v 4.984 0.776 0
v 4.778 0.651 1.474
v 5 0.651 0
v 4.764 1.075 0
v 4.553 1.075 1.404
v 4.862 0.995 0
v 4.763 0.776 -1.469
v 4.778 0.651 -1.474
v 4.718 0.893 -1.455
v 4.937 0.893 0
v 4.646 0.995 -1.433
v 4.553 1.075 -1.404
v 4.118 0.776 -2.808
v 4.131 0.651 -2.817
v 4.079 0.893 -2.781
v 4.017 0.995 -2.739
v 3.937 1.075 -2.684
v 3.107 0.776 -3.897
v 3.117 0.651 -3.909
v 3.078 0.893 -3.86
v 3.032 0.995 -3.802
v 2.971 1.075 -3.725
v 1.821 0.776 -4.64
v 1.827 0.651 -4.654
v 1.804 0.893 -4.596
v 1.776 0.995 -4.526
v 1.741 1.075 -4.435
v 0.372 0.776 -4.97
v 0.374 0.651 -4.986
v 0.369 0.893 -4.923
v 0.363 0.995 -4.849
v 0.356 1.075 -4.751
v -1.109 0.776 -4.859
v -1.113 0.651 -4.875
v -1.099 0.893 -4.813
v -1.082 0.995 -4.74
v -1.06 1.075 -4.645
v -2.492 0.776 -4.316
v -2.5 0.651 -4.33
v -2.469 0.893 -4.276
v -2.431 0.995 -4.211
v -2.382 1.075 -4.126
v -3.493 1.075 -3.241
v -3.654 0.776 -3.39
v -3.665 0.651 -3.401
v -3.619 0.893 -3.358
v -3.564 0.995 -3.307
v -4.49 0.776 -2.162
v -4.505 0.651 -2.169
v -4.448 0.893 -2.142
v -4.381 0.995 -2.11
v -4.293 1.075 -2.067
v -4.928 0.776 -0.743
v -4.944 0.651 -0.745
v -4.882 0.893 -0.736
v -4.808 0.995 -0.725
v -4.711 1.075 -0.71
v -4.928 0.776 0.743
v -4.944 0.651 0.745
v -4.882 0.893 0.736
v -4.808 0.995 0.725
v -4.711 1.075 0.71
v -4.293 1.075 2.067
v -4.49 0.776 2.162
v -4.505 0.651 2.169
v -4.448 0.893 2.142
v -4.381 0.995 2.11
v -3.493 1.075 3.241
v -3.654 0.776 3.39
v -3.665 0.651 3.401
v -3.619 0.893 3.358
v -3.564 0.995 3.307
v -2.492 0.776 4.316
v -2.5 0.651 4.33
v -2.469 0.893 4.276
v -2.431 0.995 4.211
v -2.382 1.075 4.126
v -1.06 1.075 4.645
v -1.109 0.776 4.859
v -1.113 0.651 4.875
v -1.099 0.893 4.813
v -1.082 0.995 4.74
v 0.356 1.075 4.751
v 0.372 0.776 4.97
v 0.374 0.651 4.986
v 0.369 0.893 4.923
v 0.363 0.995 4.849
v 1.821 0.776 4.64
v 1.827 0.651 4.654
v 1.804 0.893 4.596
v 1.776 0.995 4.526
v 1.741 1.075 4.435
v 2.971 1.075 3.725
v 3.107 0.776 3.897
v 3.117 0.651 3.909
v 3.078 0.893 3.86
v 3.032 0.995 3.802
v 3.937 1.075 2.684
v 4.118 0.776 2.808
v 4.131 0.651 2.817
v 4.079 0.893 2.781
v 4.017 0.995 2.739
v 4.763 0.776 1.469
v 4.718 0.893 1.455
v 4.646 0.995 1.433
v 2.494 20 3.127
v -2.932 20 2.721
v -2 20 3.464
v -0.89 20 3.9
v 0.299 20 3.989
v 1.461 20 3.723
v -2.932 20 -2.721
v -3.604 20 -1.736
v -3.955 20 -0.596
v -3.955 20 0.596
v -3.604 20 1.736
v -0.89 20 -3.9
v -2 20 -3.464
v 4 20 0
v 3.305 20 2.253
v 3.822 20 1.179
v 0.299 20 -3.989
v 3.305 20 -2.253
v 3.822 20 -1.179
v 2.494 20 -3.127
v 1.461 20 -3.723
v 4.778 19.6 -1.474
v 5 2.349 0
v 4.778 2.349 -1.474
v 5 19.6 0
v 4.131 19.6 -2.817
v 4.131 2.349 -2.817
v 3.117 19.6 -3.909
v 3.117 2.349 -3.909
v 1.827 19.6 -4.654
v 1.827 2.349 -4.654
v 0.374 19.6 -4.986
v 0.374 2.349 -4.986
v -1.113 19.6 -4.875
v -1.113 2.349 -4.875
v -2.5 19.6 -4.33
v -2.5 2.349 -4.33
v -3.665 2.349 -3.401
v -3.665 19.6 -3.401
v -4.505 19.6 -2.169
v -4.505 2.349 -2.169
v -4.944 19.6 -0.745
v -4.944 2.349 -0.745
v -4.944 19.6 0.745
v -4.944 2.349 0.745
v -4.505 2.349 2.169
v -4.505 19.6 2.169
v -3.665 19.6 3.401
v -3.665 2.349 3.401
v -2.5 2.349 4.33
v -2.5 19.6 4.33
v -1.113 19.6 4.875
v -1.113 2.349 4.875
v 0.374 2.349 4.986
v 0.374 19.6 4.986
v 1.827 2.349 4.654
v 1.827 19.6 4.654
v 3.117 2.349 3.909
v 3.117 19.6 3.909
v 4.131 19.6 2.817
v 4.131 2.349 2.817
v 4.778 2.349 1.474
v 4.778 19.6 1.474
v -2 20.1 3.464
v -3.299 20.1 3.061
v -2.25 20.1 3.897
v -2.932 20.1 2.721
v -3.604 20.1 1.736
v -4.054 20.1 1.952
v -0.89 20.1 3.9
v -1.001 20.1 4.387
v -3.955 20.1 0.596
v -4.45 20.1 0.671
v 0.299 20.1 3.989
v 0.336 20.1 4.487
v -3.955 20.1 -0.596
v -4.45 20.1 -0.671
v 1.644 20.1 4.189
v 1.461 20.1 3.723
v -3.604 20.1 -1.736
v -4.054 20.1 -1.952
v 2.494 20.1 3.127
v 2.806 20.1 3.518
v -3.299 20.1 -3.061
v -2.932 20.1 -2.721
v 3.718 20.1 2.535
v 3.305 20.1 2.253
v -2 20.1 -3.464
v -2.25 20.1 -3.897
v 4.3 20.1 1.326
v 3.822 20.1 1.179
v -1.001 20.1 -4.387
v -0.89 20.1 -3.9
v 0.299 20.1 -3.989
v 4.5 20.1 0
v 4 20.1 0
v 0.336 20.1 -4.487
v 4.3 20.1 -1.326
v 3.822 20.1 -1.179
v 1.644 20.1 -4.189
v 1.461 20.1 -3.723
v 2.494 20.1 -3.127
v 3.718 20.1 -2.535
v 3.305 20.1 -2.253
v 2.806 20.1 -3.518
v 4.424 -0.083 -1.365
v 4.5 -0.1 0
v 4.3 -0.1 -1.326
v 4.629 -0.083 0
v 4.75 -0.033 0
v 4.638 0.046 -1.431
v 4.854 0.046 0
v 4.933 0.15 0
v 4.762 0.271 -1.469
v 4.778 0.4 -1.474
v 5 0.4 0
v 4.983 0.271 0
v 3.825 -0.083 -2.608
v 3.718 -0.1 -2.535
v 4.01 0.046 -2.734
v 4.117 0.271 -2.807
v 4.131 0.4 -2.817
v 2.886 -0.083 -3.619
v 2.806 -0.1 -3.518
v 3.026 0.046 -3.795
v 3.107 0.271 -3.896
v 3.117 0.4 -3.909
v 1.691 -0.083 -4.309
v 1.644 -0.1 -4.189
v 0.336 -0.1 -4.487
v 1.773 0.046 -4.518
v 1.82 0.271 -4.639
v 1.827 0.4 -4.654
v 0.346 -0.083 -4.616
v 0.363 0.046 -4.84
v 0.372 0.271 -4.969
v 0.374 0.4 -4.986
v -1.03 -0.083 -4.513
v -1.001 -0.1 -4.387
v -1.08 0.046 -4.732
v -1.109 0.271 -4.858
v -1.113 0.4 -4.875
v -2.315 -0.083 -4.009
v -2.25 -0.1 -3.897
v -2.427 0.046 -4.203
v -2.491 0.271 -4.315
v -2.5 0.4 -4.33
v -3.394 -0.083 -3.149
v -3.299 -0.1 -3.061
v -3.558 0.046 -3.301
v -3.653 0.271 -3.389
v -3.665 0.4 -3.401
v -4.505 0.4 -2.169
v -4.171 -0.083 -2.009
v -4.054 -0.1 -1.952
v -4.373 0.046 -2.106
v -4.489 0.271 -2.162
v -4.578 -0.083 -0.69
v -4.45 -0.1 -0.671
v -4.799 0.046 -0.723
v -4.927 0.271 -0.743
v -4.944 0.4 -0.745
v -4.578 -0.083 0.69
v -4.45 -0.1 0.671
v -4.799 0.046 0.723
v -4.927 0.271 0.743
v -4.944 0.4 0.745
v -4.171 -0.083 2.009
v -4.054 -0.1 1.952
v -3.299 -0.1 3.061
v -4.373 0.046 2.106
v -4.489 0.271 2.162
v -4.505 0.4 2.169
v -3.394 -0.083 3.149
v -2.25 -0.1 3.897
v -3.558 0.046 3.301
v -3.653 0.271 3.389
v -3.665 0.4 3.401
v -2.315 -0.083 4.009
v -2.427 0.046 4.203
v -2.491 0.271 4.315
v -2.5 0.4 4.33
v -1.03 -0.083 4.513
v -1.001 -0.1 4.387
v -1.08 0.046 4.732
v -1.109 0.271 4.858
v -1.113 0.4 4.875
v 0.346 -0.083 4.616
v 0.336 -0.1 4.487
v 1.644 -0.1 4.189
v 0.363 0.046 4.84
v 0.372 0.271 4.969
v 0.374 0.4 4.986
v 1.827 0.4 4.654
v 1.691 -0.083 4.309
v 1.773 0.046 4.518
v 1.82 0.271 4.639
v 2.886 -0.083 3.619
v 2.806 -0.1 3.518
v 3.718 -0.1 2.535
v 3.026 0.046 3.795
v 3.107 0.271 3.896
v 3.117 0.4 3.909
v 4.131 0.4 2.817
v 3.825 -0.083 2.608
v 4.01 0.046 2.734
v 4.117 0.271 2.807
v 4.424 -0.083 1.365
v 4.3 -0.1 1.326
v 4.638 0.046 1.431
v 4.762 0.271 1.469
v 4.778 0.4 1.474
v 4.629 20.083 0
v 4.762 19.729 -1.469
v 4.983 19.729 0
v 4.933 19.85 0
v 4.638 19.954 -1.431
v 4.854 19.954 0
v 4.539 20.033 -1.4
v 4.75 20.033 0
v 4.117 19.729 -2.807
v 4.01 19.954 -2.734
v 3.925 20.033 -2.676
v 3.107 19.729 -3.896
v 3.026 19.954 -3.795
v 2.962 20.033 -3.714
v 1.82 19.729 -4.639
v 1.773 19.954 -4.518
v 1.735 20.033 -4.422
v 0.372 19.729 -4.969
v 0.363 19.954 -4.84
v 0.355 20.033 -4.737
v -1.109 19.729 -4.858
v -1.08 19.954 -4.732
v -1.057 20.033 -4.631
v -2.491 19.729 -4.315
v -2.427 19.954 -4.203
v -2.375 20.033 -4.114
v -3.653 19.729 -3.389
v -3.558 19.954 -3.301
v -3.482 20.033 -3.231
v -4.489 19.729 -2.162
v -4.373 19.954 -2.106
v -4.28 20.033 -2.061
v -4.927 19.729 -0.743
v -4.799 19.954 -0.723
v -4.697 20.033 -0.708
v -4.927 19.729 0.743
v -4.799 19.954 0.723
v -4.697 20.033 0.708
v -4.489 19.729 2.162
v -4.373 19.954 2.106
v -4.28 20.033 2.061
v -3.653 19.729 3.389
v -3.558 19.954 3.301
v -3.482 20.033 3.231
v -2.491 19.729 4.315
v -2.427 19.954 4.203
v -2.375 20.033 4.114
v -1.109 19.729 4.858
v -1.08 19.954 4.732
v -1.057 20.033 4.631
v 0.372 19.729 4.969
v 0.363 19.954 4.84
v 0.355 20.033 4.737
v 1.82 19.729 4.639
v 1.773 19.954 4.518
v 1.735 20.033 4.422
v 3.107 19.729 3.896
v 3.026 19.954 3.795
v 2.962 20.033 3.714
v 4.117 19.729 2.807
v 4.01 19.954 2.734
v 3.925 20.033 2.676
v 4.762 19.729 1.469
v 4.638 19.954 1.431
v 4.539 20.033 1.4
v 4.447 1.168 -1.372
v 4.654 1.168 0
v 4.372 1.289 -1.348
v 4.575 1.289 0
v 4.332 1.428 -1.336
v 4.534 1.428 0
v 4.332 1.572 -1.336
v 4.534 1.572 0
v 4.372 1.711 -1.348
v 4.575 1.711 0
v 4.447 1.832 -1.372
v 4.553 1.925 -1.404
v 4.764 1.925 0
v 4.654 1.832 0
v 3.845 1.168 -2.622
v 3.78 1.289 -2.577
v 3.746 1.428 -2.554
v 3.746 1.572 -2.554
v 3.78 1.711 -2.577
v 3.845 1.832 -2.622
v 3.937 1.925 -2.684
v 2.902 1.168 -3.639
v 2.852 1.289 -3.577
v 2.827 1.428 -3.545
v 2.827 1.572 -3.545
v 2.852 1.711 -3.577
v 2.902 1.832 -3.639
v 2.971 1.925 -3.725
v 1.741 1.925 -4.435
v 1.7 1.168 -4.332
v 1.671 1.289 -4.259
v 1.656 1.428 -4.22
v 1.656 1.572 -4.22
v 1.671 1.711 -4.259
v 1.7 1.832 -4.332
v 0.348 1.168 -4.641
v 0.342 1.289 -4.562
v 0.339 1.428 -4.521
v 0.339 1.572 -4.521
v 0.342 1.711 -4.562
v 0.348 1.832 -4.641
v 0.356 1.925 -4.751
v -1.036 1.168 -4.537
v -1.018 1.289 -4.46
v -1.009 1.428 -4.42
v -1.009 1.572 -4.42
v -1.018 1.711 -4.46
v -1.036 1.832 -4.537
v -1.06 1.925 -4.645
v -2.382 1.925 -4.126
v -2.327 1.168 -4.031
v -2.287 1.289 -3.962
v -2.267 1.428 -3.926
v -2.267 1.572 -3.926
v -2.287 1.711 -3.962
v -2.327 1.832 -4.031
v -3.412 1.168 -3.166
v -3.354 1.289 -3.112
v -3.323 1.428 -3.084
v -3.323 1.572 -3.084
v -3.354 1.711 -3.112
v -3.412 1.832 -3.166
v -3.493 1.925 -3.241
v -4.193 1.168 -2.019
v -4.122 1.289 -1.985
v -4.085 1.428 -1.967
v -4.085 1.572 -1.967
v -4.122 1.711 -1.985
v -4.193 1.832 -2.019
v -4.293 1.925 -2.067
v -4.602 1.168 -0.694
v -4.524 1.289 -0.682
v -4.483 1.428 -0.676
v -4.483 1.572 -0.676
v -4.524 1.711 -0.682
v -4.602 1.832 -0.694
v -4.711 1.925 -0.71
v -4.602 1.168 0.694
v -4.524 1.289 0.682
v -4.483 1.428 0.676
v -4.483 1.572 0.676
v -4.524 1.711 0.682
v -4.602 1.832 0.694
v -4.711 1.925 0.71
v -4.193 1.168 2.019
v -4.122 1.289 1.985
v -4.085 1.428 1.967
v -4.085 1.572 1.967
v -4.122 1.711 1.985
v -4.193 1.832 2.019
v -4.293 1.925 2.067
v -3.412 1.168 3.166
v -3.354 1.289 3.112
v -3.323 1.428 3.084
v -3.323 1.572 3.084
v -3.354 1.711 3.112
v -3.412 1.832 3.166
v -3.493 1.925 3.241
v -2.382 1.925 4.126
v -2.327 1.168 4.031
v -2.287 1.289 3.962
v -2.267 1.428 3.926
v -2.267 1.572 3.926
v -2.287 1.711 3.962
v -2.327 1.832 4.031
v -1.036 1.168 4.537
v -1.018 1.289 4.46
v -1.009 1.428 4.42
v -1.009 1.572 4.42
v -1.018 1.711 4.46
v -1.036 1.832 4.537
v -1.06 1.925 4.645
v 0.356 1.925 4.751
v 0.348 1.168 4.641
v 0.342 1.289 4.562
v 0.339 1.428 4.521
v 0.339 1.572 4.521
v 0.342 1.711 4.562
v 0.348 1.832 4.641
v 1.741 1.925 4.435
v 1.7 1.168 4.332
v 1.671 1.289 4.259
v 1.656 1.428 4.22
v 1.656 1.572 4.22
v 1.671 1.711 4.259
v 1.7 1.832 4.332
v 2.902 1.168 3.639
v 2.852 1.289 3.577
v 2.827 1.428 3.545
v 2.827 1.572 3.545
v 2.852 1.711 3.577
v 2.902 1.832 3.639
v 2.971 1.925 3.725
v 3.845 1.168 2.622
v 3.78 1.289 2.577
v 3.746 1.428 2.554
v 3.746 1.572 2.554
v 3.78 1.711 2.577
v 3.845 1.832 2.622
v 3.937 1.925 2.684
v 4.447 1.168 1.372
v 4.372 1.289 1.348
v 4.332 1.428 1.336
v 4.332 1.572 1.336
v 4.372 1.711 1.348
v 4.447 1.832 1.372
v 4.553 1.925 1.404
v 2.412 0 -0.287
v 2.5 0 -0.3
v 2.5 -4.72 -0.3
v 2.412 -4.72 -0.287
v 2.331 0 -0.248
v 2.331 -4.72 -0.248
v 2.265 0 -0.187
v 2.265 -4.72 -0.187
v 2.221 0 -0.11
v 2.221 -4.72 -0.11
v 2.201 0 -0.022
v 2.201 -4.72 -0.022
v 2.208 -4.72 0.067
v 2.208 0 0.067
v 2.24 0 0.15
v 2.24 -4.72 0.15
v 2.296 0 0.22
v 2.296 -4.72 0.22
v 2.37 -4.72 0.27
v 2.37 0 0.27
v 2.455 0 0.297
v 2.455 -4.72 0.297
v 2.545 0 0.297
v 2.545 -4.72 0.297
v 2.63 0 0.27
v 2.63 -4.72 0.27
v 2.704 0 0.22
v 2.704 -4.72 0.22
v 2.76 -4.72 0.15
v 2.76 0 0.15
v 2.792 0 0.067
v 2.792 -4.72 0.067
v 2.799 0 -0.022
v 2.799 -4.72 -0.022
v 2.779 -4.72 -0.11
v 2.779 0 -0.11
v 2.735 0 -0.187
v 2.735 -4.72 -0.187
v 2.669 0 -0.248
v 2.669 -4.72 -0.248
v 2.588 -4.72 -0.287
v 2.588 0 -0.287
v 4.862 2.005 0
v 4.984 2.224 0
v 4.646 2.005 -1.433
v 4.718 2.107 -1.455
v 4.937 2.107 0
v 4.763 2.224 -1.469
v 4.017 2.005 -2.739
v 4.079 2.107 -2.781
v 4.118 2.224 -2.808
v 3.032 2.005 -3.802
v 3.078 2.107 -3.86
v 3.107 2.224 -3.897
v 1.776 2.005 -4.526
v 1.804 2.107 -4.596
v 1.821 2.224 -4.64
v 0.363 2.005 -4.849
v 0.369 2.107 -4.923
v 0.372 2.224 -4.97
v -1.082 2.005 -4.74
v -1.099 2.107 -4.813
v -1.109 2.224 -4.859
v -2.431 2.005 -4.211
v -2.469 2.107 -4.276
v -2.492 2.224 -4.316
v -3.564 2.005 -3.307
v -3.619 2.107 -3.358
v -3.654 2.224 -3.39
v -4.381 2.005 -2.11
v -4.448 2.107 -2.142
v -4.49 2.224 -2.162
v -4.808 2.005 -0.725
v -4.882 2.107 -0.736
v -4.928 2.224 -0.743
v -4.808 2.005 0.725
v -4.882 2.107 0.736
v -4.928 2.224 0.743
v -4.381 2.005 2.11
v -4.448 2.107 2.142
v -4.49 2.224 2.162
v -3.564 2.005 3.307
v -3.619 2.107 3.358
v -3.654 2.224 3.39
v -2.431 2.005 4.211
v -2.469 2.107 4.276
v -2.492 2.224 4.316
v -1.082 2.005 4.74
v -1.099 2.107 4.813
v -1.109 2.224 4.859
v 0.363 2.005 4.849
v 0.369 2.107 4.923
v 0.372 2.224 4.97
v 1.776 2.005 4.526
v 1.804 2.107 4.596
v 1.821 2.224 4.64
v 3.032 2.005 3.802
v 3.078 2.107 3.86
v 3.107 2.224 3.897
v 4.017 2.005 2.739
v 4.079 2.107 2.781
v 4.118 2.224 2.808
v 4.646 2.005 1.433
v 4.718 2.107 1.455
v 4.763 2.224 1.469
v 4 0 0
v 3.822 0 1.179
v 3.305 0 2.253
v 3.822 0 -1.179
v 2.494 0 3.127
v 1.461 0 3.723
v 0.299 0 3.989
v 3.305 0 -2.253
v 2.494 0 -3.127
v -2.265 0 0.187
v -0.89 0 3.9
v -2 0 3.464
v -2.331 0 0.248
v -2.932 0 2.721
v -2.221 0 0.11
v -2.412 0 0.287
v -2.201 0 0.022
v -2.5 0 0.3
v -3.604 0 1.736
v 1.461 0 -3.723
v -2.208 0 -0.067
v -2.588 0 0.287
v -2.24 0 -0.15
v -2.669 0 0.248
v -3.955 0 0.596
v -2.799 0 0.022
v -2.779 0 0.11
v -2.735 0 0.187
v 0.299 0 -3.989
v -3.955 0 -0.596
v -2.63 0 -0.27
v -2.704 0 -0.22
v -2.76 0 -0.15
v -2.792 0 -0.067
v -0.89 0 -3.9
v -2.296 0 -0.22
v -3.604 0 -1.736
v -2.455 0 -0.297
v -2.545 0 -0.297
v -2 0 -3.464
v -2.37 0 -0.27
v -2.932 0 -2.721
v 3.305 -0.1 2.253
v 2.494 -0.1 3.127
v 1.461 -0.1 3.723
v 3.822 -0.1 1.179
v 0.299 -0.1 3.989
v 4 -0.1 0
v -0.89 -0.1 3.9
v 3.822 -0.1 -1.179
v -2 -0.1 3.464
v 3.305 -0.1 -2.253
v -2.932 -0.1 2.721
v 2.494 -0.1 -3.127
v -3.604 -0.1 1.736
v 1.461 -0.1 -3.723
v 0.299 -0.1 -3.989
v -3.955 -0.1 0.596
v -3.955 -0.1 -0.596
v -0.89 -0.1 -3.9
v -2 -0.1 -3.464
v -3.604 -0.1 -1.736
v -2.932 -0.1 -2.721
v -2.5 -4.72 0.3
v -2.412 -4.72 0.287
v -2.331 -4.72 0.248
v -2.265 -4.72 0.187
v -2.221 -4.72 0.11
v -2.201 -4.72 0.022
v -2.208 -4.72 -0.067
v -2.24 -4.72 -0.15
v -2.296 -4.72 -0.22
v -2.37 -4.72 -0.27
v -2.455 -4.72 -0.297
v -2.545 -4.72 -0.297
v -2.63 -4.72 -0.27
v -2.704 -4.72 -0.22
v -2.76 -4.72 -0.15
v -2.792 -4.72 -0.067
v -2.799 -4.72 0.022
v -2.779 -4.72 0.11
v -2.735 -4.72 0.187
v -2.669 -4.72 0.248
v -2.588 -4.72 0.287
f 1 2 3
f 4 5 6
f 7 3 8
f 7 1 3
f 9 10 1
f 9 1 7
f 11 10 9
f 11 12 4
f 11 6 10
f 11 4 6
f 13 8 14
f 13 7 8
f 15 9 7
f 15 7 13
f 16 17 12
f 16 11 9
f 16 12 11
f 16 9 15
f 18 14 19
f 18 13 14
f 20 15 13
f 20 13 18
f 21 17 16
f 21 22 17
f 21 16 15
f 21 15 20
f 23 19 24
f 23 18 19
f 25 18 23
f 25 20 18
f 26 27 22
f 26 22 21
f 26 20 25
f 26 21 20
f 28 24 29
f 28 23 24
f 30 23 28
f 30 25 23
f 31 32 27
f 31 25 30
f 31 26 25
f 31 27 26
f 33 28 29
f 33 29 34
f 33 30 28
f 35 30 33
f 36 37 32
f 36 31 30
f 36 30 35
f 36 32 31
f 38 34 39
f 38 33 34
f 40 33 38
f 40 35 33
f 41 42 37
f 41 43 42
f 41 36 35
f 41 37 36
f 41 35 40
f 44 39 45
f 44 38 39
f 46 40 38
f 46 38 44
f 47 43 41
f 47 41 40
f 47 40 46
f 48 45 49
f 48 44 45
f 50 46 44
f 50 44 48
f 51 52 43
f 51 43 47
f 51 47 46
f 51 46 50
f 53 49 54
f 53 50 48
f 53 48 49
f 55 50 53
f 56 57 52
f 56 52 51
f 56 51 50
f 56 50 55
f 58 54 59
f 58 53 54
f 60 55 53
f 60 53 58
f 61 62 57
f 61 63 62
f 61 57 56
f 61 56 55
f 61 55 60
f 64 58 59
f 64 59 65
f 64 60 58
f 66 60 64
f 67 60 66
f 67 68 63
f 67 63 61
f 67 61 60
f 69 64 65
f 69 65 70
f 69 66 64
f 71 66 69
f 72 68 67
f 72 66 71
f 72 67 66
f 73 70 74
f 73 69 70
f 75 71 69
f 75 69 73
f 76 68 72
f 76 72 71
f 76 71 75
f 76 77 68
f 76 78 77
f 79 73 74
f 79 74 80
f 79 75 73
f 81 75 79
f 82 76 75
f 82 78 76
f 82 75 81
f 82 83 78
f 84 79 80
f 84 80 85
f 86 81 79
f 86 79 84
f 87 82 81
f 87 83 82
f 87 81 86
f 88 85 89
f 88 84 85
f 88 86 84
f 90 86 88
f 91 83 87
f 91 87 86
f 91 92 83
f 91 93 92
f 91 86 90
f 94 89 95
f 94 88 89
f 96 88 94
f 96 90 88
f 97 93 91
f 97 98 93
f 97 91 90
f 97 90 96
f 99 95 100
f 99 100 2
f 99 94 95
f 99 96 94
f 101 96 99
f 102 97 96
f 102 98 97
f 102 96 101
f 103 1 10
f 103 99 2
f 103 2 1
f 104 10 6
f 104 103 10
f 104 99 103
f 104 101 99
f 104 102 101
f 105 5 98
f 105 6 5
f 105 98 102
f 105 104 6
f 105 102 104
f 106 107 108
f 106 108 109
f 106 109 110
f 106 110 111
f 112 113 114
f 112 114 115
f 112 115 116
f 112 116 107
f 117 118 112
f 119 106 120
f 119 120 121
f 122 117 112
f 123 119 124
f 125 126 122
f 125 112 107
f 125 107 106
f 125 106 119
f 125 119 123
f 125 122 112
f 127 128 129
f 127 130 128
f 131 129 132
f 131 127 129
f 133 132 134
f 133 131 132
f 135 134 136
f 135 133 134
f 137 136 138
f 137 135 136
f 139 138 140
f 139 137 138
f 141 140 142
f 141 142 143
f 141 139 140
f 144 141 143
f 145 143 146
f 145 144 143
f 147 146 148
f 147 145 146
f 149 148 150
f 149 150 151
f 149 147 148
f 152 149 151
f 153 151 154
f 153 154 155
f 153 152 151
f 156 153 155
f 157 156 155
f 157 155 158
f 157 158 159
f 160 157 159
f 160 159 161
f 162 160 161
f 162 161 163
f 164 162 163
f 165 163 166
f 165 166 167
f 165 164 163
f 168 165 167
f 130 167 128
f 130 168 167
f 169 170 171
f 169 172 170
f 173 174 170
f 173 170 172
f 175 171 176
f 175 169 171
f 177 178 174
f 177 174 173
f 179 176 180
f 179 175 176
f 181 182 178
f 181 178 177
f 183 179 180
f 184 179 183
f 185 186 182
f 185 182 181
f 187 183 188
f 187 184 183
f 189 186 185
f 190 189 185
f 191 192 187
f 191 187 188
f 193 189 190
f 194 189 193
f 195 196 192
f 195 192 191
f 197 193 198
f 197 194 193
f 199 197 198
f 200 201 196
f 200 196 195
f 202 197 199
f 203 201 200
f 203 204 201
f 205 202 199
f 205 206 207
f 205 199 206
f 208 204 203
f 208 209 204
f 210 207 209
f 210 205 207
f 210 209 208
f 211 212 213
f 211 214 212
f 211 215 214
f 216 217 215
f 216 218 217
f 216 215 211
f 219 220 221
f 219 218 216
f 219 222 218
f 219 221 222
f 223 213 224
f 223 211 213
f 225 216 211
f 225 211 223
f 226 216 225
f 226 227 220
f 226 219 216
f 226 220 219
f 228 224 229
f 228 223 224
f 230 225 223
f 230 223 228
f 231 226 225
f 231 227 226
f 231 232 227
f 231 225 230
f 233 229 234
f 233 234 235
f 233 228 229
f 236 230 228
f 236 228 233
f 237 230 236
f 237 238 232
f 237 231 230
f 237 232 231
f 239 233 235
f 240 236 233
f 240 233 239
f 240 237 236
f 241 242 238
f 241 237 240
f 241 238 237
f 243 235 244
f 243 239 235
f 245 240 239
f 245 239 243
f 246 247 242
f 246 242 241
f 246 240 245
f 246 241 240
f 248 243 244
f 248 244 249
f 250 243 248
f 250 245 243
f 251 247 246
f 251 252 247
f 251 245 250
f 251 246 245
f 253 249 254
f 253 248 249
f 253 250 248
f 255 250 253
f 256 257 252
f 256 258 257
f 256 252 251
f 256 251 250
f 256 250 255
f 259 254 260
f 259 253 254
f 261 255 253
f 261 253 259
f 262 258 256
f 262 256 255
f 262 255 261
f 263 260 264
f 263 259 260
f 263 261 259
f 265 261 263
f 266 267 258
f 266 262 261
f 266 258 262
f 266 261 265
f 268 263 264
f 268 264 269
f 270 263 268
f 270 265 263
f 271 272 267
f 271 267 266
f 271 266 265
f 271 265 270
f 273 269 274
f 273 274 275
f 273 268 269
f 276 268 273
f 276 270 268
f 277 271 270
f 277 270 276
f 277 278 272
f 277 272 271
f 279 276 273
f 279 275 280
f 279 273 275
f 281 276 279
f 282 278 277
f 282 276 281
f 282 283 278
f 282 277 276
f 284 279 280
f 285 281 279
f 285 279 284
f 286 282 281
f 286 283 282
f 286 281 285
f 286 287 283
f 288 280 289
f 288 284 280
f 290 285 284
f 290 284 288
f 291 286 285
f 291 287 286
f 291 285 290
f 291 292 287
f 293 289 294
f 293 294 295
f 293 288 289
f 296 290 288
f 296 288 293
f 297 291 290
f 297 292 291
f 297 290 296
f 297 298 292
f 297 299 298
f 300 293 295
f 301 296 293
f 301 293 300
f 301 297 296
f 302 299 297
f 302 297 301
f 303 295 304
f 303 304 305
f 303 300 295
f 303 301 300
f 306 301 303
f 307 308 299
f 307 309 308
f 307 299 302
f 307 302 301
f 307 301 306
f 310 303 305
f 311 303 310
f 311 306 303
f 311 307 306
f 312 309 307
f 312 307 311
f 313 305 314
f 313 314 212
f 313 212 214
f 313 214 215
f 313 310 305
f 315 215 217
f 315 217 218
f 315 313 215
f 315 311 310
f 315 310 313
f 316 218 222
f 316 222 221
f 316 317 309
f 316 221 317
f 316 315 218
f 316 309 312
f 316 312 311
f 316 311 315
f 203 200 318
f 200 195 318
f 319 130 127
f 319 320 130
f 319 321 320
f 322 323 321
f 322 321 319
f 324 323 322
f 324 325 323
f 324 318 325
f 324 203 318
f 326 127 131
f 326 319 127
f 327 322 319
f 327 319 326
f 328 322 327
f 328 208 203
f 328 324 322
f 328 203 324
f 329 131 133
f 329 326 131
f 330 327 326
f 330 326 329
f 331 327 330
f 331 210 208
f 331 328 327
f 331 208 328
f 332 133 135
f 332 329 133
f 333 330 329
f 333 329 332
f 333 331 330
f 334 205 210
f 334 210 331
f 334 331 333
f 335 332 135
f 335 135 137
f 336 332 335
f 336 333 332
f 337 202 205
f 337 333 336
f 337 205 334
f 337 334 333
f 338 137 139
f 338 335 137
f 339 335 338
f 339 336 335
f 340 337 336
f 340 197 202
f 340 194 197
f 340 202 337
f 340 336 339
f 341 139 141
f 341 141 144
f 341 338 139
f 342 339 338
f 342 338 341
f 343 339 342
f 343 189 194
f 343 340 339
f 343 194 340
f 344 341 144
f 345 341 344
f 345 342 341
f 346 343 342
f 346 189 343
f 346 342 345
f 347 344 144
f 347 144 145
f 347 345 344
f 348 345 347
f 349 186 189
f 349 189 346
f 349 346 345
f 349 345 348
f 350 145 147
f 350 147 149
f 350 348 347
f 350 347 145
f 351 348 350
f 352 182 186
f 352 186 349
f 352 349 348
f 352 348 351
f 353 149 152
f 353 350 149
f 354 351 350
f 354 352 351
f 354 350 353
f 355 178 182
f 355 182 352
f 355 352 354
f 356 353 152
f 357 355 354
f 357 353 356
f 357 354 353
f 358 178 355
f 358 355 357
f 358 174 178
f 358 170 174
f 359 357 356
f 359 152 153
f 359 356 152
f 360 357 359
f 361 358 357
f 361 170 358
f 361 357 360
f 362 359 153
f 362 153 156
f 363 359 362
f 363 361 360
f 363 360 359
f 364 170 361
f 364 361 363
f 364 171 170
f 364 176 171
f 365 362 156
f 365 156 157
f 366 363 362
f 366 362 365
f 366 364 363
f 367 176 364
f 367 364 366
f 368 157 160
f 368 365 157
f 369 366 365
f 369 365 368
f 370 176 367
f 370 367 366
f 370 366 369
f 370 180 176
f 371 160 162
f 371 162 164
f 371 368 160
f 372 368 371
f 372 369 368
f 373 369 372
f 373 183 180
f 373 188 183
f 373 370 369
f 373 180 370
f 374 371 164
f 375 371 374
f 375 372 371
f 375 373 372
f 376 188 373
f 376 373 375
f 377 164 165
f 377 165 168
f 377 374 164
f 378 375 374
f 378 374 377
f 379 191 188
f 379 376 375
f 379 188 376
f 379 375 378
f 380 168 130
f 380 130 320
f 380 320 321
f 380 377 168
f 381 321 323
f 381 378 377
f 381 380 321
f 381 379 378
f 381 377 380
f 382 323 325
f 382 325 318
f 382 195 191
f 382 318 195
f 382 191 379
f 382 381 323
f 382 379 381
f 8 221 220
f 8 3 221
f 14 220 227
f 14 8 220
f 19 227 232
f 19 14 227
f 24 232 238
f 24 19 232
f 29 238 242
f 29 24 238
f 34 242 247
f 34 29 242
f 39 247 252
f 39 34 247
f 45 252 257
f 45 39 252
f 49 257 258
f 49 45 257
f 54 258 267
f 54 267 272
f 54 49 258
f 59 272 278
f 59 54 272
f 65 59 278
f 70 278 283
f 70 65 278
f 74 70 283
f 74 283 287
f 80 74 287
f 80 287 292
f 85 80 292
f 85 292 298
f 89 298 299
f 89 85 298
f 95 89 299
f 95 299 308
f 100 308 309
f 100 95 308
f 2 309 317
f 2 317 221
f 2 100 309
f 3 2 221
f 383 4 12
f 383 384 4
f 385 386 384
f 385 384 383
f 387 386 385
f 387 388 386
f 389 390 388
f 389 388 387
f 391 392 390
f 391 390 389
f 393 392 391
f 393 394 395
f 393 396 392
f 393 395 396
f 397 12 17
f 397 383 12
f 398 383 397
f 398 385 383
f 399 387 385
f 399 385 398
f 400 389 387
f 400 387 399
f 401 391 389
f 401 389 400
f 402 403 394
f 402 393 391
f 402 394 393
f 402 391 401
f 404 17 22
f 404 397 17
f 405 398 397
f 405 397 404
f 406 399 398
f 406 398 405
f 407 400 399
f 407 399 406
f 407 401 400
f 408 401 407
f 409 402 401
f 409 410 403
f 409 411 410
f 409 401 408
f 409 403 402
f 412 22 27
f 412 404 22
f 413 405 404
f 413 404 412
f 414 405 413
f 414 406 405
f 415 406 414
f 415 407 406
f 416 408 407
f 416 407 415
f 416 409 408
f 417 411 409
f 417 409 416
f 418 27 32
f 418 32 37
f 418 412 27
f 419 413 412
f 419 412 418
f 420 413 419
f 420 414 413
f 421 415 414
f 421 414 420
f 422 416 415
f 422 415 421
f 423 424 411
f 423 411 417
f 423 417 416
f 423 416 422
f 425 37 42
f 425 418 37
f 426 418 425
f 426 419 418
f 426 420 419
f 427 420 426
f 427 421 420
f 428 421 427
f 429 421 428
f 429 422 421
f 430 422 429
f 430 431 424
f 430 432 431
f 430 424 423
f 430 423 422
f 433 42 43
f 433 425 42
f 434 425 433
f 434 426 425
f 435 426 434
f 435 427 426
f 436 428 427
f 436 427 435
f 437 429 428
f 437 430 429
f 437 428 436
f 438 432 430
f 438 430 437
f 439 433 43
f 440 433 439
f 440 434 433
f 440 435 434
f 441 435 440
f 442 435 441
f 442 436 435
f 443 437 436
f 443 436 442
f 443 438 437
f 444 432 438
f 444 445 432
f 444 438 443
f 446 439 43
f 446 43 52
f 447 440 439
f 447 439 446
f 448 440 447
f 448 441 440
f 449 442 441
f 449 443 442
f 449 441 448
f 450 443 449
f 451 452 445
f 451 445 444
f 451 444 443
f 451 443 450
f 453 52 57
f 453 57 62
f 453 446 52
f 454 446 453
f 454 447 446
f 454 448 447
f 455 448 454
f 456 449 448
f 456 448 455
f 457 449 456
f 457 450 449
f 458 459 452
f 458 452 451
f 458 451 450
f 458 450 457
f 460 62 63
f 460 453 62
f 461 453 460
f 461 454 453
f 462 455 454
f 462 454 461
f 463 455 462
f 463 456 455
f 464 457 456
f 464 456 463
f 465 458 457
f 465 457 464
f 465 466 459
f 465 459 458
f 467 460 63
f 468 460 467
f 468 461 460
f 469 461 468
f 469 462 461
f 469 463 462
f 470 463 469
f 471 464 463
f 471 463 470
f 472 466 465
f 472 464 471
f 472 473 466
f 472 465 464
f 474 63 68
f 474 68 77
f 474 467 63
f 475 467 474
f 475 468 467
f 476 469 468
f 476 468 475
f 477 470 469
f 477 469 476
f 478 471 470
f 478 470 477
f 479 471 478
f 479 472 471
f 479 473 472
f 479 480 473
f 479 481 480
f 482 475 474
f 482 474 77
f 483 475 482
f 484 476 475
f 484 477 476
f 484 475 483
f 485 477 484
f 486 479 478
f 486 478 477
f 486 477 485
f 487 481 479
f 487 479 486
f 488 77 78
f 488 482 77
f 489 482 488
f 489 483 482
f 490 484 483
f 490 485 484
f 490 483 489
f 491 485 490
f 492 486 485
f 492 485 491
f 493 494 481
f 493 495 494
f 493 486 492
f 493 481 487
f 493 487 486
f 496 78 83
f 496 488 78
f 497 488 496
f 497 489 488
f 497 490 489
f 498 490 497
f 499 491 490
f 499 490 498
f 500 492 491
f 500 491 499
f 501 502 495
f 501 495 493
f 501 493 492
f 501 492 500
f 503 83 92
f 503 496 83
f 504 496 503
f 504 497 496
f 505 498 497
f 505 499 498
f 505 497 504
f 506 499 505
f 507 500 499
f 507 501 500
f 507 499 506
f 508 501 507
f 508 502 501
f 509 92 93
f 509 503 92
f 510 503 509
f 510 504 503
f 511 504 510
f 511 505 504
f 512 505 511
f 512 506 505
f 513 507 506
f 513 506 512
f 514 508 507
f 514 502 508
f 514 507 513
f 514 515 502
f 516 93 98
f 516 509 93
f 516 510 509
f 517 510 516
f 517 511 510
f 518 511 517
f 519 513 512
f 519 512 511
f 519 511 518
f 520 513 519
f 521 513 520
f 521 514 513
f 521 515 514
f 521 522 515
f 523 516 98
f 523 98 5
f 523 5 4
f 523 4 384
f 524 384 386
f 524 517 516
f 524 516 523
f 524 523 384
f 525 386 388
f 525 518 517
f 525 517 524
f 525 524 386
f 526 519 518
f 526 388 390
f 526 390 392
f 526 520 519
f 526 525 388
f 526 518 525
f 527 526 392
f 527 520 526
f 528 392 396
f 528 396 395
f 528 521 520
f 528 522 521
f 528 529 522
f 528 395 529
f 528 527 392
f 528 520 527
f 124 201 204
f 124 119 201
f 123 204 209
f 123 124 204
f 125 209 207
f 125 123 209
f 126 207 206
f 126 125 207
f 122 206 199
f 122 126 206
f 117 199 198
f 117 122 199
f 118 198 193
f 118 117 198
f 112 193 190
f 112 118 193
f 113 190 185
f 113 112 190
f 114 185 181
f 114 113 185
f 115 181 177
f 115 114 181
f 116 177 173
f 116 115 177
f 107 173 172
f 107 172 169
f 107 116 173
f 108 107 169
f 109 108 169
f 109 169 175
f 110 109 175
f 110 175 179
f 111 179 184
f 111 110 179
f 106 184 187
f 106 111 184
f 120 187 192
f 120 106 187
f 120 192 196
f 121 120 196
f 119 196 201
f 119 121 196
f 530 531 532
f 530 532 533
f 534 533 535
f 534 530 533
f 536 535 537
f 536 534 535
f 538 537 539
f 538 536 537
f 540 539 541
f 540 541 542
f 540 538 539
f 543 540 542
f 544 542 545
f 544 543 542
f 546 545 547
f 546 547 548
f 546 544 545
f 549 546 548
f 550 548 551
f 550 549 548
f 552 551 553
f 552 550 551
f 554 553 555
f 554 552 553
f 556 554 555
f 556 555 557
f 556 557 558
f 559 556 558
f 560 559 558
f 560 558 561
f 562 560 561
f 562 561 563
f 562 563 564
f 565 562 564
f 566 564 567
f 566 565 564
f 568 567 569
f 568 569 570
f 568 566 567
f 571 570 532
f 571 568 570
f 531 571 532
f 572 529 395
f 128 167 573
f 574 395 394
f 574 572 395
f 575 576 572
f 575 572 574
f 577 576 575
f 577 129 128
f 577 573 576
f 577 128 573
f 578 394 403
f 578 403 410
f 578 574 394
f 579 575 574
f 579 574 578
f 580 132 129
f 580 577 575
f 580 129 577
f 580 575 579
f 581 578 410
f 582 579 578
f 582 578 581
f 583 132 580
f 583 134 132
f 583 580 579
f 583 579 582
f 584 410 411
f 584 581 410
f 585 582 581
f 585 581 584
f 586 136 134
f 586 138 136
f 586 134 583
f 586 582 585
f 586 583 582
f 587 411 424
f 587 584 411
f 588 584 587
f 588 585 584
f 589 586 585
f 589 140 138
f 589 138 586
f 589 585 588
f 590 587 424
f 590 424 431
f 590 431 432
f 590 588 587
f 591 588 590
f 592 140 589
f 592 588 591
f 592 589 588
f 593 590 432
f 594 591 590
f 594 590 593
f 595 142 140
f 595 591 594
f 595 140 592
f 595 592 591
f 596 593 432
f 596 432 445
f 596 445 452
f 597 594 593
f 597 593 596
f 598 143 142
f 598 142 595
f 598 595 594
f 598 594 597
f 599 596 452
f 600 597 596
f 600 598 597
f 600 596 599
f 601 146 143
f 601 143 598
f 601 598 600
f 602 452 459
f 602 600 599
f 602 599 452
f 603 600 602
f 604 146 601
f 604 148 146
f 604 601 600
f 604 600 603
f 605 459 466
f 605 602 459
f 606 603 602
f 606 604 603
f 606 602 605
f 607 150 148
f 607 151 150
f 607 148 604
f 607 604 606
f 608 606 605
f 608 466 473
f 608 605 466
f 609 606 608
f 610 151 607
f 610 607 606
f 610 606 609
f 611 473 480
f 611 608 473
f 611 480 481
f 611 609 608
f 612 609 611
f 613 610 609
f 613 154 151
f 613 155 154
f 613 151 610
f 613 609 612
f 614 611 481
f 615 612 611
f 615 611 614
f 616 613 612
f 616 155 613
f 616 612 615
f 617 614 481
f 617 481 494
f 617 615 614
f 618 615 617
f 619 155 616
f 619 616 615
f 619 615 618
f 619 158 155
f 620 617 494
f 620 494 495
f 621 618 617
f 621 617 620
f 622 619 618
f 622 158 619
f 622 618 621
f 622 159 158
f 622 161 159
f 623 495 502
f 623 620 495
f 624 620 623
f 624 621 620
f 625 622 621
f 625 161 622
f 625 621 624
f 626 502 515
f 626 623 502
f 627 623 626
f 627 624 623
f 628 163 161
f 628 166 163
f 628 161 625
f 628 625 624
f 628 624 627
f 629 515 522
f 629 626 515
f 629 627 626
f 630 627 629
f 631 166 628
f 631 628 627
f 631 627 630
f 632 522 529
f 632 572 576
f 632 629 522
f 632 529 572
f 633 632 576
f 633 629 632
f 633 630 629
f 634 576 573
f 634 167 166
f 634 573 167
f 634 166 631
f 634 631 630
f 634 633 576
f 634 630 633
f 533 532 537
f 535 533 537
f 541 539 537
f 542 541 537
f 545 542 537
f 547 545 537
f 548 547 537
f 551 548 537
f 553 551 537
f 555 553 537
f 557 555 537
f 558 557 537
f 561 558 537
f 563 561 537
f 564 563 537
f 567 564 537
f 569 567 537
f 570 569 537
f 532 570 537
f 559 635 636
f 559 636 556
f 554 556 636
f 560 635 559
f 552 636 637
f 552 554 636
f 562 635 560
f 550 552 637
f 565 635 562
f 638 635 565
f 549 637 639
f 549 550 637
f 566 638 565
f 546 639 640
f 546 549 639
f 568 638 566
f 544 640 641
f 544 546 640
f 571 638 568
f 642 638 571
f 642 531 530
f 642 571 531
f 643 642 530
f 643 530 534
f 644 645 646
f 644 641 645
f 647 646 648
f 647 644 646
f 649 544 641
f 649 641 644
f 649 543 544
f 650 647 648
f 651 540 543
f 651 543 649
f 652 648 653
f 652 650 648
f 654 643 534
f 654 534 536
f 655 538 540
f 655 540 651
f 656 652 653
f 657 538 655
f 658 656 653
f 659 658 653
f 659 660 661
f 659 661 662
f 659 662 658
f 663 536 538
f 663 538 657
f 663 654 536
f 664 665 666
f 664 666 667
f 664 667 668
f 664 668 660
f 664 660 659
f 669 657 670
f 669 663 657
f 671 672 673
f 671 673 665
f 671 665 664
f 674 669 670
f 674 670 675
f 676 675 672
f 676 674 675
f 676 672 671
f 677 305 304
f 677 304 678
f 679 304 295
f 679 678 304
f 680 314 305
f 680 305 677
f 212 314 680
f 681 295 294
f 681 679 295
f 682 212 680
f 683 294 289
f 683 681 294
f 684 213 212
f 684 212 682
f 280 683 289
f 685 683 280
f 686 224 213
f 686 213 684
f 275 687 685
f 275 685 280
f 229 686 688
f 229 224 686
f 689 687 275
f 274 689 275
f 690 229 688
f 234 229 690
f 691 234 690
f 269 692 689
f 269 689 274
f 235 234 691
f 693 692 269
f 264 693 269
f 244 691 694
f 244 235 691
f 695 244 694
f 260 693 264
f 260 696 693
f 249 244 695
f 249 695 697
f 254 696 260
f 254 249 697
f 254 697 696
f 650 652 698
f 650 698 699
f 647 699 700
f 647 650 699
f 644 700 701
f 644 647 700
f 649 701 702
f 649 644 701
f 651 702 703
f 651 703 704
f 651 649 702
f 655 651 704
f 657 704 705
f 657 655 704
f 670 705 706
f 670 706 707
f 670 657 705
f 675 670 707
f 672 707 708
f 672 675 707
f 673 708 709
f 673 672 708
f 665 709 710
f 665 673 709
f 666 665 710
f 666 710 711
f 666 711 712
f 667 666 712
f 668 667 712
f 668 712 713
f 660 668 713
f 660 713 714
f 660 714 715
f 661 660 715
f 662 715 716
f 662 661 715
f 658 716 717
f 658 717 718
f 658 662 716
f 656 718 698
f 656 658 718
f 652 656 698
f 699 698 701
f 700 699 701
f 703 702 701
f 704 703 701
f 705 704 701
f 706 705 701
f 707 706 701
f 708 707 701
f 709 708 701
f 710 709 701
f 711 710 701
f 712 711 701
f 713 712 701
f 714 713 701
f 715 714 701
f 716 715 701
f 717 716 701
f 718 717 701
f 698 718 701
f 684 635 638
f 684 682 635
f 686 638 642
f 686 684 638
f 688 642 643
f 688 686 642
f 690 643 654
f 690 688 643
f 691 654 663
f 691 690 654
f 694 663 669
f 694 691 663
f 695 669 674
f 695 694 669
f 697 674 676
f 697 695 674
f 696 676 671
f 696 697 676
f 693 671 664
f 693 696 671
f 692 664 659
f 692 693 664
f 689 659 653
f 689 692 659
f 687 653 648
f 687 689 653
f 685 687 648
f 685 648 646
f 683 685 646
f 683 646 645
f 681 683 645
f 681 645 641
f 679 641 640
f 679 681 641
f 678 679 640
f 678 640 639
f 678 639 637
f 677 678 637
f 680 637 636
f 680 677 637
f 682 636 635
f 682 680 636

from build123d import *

# Parameters (mm, degrees)
SKETCH1_R             = 0.3
BOSS_EXTRUDE1_DEPTH   = 4.72
BOSS_EXTRUDE1_2_DEPTH = 4.72


with BuildPart() as part:
    # Sketch1 → Boss-Extrude1 (new body)
    with BuildSketch(Plane(origin=(0, 0, 0), x_dir=(1, 0, 0), z_dir=(0, 1, 0))):
        with Locations(Location((-2.5, 0, 0), (0, 0, 270))):
            Circle(SKETCH1_R)
    extrude(amount=-BOSS_EXTRUDE1_DEPTH)



with BuildPart() as body_2:
    # Sketch1 → Boss-Extrude1 2 (new body)
    with BuildSketch(Plane(origin=(0, 0, 0), x_dir=(1, 0, 0), z_dir=(0, 1, 0))):
        with Locations(Location((2.5, 0, 0), (0, 0, 90))):
            Circle(SKETCH1_R)
    extrude(amount=-BOSS_EXTRUDE1_2_DEPTH)


with BuildPart() as part_1:
    add(part.part)

    add(body_2.part)  # Revolve1 merges body 2
    # Sketch3 → Revolve1 (revolve)
    with BuildSketch(Plane.XY):
        with BuildLine():
            Line((5, 0.4), (5, 0.650521697))
            ThreePointArc((5, 0.650521697), (4.937148311, 0.893217708), (4.764394584, 1.074898303))
            ThreePointArc((4.764394584, 1.074898303), (4.528386612, 1.5), (4.764394584, 1.925101697))
            ThreePointArc((4.764394584, 1.925101697), (4.937148311, 2.106782292), (5, 2.349478303))
            Line((5, 2.349478303), (5, 19.6))
            ThreePointArc((5, 19.6), (4.853553391, 19.953553391), (4.5, 20.1))
            Line((4.5, 20.1), (4, 20.1))
            Line((4, 20.1), (4, 20))
            Line((4, 20), (0, 20))
            Line((0, 20), (0, 0))
            Line((0, 0), (4, 0))
            Line((4, 0), (4, -0.1))
            Line((4, -0.1), (4.5, -0.1))
            ThreePointArc((4.5, -0.1), (4.853553391, 0.046446609), (5, 0.4))
        make_face()
    revolve(axis=Axis((0, 0, 0), (0, 1, 0)))


solid = part_1.part
